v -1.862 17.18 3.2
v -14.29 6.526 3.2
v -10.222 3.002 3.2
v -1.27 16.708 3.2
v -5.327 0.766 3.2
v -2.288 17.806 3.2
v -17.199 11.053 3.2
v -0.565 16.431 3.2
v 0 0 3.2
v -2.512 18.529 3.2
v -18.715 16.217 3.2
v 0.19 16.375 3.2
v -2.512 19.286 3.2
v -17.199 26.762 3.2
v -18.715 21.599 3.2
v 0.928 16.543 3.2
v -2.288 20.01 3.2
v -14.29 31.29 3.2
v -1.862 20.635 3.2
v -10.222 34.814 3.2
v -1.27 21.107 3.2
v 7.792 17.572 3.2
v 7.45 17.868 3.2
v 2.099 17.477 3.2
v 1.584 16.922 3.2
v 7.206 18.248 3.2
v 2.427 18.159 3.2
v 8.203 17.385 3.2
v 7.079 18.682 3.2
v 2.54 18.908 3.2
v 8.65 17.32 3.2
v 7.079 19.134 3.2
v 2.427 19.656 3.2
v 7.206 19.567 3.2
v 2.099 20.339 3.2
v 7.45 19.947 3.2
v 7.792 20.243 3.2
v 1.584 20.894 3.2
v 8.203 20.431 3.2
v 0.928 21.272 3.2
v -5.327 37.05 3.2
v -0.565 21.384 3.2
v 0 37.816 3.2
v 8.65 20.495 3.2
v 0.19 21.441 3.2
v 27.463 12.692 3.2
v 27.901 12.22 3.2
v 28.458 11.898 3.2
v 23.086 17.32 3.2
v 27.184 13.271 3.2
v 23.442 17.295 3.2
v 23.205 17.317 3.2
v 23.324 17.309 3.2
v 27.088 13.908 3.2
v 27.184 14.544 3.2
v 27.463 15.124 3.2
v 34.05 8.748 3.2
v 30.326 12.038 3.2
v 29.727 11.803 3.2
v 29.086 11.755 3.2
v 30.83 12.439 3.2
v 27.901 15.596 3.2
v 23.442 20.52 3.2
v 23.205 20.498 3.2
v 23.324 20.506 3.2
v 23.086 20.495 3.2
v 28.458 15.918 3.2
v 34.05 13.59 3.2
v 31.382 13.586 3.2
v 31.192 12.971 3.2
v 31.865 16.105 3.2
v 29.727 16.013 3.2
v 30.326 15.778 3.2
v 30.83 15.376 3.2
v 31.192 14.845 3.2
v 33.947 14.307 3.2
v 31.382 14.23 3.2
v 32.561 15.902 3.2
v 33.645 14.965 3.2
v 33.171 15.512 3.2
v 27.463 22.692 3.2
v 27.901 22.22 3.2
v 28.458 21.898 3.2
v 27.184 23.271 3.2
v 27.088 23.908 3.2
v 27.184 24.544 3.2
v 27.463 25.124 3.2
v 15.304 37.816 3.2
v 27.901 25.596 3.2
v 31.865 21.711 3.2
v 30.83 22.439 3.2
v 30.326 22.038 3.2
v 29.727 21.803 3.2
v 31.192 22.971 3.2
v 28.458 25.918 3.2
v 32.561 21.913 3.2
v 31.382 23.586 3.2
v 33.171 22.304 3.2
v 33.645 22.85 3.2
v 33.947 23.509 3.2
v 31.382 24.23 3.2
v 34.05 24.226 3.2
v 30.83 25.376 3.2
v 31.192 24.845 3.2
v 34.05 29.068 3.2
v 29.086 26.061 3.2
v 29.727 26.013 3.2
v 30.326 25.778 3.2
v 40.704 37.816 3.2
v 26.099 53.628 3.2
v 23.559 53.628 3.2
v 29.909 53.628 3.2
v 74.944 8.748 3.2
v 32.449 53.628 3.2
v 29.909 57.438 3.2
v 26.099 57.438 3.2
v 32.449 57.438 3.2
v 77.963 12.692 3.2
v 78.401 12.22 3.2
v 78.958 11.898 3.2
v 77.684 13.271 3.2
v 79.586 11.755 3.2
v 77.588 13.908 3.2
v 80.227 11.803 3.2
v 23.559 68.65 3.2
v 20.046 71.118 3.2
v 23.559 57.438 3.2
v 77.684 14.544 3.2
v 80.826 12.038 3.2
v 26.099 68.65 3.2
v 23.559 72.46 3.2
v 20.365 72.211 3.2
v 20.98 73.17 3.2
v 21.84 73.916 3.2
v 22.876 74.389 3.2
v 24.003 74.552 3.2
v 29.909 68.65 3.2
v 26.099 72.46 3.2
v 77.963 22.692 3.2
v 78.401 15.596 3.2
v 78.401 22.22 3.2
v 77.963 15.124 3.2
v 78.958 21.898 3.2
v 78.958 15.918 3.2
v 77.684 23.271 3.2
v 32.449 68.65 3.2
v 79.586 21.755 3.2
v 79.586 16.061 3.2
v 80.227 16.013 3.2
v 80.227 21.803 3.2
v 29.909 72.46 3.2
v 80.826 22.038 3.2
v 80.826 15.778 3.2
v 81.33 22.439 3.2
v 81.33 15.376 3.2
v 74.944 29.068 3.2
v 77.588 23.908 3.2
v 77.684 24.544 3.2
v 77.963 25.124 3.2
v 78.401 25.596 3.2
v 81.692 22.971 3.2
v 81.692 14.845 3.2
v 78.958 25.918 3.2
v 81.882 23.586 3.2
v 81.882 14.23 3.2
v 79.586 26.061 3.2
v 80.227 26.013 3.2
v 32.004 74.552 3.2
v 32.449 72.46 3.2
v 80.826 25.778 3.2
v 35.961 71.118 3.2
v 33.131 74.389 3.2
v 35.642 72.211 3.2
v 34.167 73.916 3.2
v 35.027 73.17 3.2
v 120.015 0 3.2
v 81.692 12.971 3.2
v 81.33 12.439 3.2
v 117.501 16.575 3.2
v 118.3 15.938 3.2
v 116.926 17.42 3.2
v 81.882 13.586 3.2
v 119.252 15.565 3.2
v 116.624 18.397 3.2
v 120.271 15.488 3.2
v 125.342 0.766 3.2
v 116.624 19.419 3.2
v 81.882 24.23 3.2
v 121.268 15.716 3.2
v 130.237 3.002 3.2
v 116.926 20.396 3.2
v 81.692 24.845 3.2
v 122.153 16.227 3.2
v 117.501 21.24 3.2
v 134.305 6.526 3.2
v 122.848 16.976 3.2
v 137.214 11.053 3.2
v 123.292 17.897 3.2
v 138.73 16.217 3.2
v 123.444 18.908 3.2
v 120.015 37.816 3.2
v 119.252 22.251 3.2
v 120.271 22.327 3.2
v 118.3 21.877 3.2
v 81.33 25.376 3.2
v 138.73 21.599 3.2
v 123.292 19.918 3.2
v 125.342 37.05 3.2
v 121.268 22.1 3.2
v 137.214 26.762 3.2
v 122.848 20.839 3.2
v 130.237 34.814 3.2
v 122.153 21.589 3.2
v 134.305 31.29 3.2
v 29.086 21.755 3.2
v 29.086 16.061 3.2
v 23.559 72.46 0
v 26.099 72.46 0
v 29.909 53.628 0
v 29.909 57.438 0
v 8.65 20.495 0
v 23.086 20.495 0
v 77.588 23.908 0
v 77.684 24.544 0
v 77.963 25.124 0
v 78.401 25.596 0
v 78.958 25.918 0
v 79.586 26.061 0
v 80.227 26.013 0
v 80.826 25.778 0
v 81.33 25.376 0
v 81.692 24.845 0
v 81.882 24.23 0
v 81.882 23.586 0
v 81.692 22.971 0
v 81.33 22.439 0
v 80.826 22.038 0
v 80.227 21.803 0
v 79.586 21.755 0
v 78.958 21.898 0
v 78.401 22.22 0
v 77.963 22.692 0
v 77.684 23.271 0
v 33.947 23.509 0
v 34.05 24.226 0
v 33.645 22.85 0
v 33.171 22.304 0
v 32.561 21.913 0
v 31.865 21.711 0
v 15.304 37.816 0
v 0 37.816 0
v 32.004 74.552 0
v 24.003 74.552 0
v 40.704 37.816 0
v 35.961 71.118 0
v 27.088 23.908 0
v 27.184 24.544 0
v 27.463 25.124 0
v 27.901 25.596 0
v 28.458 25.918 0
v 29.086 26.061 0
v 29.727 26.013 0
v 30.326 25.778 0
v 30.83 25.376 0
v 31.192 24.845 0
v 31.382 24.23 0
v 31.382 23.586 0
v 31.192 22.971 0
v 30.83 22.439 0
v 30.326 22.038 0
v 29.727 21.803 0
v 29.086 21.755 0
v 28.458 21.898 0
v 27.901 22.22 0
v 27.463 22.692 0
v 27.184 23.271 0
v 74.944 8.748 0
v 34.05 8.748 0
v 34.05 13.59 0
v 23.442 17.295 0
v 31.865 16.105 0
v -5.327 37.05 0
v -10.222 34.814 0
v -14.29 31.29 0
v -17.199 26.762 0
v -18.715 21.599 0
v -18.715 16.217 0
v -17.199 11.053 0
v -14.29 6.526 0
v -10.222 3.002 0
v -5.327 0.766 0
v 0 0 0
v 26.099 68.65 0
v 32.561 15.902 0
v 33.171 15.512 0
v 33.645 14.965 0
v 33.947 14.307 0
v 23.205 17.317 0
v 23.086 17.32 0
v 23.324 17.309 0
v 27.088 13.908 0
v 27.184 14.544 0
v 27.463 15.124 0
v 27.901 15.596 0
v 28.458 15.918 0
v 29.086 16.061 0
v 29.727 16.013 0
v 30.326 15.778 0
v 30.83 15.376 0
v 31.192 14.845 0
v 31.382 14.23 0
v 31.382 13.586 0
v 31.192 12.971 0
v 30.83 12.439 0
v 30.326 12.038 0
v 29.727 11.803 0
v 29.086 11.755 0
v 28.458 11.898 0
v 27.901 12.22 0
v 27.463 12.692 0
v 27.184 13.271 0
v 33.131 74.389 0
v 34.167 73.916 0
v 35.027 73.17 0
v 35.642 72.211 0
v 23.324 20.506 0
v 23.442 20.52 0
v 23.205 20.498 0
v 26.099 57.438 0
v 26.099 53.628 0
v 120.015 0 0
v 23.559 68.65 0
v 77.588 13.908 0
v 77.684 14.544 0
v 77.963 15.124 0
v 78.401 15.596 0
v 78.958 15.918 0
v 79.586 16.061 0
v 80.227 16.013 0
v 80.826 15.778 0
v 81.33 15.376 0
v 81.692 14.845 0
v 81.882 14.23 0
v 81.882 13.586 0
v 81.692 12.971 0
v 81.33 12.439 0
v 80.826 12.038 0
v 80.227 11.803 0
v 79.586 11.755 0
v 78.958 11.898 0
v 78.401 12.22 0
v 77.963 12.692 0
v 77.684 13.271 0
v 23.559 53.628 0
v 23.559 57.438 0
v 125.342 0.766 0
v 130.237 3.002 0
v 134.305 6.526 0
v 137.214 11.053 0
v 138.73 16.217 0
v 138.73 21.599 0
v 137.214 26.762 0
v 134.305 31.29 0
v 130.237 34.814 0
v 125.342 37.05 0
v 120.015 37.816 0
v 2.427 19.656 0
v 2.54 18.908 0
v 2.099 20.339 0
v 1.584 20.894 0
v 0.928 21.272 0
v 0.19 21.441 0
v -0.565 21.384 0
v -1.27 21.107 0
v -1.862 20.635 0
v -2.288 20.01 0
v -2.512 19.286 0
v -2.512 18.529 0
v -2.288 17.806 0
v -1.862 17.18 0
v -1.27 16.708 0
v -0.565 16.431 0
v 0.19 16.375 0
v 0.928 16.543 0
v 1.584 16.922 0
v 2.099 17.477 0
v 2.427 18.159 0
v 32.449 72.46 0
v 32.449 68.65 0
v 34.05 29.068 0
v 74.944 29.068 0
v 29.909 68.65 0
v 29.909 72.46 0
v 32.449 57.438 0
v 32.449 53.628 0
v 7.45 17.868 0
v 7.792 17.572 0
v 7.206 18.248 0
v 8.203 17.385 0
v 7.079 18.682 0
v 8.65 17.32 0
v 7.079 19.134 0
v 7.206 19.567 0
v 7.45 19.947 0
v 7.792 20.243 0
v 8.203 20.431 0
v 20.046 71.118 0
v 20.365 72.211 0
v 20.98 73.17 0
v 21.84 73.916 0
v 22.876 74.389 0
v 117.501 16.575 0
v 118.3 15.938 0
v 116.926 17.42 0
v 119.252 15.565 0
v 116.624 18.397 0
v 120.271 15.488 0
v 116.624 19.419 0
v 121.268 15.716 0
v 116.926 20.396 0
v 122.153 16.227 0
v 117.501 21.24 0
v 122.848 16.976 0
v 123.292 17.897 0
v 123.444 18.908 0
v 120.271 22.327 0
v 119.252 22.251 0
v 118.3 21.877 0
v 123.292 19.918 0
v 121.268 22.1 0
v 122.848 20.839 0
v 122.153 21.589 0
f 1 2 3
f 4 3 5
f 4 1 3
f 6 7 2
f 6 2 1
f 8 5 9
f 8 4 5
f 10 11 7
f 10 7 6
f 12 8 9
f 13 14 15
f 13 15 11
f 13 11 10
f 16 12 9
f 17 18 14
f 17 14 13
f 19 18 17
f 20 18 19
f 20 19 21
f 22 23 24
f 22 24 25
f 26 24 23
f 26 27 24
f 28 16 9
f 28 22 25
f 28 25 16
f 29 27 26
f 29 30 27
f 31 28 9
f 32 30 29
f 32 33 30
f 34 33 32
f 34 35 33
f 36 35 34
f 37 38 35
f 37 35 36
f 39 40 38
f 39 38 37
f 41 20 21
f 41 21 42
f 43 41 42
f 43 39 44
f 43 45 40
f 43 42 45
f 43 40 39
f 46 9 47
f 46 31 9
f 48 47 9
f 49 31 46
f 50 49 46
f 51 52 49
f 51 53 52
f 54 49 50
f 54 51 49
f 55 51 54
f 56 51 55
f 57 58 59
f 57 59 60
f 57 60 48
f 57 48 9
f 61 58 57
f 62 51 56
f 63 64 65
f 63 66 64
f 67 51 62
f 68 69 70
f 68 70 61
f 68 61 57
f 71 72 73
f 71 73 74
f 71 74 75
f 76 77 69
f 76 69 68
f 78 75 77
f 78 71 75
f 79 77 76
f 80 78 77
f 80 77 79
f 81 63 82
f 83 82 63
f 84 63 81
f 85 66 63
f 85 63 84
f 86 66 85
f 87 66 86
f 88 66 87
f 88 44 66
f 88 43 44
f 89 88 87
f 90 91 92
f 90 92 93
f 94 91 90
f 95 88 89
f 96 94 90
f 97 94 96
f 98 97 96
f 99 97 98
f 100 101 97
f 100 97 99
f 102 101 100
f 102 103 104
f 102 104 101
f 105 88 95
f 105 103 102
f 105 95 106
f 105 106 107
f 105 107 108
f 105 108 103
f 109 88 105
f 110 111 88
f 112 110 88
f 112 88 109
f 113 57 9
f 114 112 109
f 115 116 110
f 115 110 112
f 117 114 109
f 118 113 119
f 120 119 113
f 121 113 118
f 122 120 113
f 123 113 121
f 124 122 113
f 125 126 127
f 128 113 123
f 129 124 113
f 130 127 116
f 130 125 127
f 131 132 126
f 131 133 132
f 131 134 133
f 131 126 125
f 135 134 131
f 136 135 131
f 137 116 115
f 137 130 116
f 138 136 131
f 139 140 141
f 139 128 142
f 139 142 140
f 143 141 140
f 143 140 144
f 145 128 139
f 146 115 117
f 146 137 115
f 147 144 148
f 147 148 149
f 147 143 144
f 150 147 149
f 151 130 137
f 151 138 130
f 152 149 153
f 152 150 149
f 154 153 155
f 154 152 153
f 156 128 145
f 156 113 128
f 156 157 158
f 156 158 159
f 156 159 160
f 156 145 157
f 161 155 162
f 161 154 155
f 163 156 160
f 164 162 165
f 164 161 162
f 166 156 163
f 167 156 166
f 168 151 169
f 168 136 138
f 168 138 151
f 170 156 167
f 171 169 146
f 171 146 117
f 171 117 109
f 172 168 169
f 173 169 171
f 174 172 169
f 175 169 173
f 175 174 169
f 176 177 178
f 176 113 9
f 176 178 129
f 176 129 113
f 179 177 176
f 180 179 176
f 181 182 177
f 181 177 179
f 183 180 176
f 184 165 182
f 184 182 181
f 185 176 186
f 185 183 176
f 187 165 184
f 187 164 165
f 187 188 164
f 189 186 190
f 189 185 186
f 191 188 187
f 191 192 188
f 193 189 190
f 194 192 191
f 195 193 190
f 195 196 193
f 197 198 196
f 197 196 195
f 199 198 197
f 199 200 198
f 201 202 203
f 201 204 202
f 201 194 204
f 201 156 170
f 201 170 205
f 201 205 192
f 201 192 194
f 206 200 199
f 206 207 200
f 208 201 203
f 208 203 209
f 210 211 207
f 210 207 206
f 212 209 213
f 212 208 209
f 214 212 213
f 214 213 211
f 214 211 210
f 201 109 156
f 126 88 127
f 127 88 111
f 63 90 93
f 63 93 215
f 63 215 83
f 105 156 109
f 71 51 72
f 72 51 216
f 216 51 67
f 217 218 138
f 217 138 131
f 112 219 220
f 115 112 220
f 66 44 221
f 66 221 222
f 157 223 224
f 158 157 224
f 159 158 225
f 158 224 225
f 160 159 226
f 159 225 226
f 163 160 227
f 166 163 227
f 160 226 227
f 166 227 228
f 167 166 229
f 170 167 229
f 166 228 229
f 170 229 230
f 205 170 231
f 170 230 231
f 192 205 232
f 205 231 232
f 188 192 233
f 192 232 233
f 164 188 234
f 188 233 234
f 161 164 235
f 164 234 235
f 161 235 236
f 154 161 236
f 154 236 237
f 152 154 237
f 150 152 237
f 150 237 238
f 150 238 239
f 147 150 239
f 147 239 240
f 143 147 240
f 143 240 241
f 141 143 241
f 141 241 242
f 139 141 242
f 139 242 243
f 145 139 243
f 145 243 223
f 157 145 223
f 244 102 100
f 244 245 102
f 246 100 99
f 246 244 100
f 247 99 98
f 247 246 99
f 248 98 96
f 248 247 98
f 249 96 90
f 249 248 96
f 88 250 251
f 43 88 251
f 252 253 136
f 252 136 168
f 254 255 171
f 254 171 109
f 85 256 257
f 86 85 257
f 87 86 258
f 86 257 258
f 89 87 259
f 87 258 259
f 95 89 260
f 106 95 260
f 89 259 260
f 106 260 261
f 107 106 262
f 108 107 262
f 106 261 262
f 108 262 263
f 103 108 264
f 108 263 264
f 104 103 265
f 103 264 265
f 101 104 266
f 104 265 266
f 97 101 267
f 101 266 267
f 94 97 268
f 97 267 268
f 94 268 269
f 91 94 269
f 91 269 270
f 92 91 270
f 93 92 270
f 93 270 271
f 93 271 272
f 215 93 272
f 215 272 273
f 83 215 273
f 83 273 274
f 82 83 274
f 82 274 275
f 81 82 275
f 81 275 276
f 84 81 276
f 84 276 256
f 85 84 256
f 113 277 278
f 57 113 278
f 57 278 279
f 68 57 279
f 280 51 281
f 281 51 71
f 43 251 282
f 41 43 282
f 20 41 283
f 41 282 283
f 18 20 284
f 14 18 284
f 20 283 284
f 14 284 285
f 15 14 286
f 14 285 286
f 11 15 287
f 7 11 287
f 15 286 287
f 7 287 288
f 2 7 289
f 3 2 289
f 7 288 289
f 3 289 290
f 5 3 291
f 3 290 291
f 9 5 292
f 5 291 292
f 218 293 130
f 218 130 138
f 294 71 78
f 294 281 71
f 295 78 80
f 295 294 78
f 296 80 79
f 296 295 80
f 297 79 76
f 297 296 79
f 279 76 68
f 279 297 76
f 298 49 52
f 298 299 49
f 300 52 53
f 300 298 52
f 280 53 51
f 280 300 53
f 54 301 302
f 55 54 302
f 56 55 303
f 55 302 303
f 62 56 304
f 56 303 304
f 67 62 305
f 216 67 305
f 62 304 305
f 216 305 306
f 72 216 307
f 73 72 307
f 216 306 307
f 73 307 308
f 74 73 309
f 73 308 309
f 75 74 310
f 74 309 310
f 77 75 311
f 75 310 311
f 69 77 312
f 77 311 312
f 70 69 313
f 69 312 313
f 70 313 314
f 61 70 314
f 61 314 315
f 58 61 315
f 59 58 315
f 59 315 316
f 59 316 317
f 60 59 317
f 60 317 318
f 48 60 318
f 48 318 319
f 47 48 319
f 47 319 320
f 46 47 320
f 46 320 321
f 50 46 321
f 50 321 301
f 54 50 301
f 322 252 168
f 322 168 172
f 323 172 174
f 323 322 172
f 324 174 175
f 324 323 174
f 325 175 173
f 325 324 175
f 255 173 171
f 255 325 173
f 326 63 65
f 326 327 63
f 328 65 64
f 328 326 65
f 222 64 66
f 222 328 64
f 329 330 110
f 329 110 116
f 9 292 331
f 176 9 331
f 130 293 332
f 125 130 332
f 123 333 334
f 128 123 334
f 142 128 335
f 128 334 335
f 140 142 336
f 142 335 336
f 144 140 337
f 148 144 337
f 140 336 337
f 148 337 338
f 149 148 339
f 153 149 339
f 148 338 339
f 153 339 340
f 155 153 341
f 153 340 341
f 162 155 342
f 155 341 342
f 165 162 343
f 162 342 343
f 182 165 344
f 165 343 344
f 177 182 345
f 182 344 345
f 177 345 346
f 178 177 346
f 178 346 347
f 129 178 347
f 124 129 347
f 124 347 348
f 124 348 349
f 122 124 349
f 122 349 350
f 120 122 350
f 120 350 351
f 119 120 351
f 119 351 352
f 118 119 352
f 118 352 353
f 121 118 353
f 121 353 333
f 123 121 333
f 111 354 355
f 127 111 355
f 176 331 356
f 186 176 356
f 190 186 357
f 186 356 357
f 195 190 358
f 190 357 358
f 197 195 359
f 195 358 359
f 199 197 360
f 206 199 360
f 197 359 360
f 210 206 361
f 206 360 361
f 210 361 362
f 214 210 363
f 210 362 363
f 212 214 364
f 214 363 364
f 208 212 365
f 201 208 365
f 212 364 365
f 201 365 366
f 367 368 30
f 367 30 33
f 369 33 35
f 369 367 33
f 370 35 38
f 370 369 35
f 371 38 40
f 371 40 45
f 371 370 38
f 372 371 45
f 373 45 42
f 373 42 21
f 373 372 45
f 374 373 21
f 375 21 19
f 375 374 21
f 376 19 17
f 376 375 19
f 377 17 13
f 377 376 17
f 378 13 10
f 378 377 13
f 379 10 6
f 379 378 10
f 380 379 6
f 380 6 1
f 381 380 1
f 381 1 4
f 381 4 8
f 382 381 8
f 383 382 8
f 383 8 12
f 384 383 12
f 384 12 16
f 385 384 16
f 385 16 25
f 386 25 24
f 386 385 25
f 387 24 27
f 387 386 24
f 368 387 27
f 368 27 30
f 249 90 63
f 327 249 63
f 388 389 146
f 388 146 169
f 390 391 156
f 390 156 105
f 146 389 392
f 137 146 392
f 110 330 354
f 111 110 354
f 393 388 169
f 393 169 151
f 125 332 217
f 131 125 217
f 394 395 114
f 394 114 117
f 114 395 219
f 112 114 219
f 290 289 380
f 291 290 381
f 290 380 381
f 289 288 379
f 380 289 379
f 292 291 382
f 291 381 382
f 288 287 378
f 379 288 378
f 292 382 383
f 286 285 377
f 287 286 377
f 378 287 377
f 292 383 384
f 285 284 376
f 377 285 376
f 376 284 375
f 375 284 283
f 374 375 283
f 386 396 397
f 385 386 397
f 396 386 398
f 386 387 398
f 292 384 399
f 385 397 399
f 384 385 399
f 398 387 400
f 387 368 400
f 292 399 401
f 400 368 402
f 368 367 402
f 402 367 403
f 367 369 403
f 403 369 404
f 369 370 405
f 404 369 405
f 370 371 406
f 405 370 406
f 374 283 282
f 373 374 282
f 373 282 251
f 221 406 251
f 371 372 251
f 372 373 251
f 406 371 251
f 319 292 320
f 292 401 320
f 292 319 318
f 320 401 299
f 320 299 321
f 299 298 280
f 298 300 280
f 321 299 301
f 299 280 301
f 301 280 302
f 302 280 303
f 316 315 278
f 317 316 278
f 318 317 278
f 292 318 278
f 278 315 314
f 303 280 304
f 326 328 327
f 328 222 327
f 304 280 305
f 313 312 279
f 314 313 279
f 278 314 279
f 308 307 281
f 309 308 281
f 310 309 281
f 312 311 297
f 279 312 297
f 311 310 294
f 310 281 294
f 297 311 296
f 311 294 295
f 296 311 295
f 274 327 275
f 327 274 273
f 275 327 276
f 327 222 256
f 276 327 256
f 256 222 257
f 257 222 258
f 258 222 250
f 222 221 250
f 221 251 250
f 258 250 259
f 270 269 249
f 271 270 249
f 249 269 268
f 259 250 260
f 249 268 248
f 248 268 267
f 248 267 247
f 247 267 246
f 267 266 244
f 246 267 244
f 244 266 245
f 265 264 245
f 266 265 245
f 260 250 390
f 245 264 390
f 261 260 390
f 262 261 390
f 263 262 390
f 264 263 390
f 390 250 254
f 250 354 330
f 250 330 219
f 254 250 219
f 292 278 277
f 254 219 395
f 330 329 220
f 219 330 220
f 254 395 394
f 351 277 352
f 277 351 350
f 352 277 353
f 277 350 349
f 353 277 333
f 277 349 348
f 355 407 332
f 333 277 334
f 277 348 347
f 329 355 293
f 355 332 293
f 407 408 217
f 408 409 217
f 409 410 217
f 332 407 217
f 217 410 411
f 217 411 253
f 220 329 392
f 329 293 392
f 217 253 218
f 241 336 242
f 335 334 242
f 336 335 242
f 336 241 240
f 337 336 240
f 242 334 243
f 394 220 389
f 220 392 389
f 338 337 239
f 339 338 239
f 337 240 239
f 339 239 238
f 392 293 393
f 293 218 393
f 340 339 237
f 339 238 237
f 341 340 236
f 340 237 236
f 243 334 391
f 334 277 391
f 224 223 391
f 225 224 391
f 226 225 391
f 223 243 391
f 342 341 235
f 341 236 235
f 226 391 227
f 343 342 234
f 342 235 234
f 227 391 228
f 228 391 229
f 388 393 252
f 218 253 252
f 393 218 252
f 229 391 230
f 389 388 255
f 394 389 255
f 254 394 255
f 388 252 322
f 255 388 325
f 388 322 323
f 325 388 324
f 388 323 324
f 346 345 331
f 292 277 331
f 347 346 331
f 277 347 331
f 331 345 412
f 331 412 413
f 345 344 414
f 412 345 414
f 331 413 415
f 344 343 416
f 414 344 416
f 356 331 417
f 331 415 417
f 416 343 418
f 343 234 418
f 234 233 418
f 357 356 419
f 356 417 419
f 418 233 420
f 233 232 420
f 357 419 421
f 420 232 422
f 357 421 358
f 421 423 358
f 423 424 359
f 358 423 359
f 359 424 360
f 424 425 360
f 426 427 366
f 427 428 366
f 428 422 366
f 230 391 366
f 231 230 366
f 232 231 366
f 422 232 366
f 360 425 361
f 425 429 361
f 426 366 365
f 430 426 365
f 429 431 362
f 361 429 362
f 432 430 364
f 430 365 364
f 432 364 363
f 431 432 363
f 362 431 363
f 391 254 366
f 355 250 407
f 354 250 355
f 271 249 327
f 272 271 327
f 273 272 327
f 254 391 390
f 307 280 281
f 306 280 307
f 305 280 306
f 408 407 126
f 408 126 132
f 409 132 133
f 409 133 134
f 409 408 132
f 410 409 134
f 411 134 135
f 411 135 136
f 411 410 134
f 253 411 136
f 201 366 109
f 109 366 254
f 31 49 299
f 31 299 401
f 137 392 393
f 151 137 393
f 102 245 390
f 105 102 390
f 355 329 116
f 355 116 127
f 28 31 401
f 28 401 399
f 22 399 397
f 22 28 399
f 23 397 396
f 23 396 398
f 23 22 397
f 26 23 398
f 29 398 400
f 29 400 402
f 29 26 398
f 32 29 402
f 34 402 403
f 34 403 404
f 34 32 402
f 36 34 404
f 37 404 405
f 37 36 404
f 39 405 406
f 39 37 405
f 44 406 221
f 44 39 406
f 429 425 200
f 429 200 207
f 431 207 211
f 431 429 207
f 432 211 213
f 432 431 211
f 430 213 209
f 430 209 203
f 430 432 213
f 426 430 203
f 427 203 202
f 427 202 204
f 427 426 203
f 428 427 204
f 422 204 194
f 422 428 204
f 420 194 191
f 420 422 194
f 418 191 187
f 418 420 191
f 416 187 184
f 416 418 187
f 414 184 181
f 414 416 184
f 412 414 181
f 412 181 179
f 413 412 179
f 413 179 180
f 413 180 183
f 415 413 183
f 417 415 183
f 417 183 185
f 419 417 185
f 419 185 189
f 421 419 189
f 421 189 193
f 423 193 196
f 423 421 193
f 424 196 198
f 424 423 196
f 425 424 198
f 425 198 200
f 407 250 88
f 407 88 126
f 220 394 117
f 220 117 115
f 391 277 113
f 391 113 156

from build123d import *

# Parameters (mm, degrees)
SKETCH1_R           = 3.429
SKETCH1_R_2         = 2.54
BOSS_EXTRUDE1_DEPTH = 3.2004
SKETCH5_R           = 2.159
SKETCH5_W           = 40.894
SKETCH5_H           = 20.32
CUT_EXTRUDE3_DEPTH  = 4.2004
CUT_EXTRUDE4_DEPTH  = 3.2004
CUT_EXTRUDE5_DEPTH  = 3.2004
SKETCH9_W           = 2.54
SKETCH9_H           = 3.81
BOSS_EXTRUDE2_DEPTH = 3.2004
FILLET1_R           = 2.54


with BuildPart() as part:
    # Sketch1 → Boss-Extrude1 (new body)
    with BuildSketch(Plane.XY):
        with BuildLine():
            Line((120.015, 37.81552), (0, 37.81552))
            ThreePointArc((0, 37.81552), (-18.90776, 18.90776), (0, 0))
            Line((0, 0), (120.015, 0))
            ThreePointArc((120.015, 0), (138.92276, 18.90776), (120.015, 37.81552))
        make_face()
        with Locations((120.015, 18.90776)):
            Circle(SKETCH1_R, mode=Mode.SUBTRACT)
        with Locations((0, 18.90776)):
            Circle(SKETCH1_R_2, mode=Mode.SUBTRACT)
    extrude(amount=BOSS_EXTRUDE1_DEPTH)

    # Sketch5 → Cut-Extrude3 (cut, through all)
    with BuildSketch(Plane(origin=(0, 0, 0), x_dir=(-1, 0, 0), z_dir=(0, 0, -1))):
        with Locations((-79.746999972, 23.90776)):
            Circle(SKETCH5_R)
        with Locations((-29.246999972, 13.90776)):
            Circle(SKETCH5_R)
        with Locations((-29.246999972, 23.90776)):
            Circle(SKETCH5_R)
        with Locations((-79.746999972, 13.90776)):
            Circle(SKETCH5_R)
        with Locations((-54.496999972, 18.90776)):
            Rectangle(SKETCH5_W, SKETCH5_H)
    extrude(amount=-CUT_EXTRUDE3_DEPTH, mode=Mode.SUBTRACT)

    # Sketch6 → Cut-Extrude4 (cut)
    with BuildSketch(Plane.XY.offset(3.2004)):
        with BuildLine():
            Line((8.649999972, 20.49526), (25.159999972, 20.49526))
            ThreePointArc((25.159999972, 20.49526), (26.747499972, 18.90776), (25.159999972, 17.32026))
            Line((25.159999972, 17.32026), (8.649999972, 17.32026))
            ThreePointArc((8.649999972, 17.32026), (7.062499972, 18.90776), (8.649999972, 20.49526))
        make_face()
    extrude(amount=-CUT_EXTRUDE4_DEPTH, mode=Mode.SUBTRACT)

    # Sketch8 → Cut-Extrude5 (cut)
    with BuildSketch(Plane.XY.offset(3.2004)):
        Polygon((34.049999972, 15.79626), (34.049999972, 22.01926), (23.264769203, 20.49526), (23.264769203, 17.32026), align=None)
    extrude(amount=-CUT_EXTRUDE5_DEPTH, mode=Mode.SUBTRACT)

    # Sketch9 → Boss-Extrude2 (add)
    with BuildSketch(Plane(origin=(0, 0, 0), x_dir=(-1, 0, 0), z_dir=(0, 0, -1))):
        with BuildLine():
            Line((-40.703500071, 37.81552), (-15.303500071, 37.81552))
            Line((-15.303500071, 37.81552), (-20.045783141, 71.118080223))
            ThreePointArc((-20.045783141, 71.118080223), (-21.383392309, 73.573639076), (-24.003000071, 74.551710005))
            Line((-24.003000071, 74.551710005), (-32.004000071, 74.551710005))
            ThreePointArc((-32.004000071, 74.551710005), (-34.623607833, 73.573639076), (-35.961217, 71.118080223))
            Line((-35.961217, 71.118080223), (-40.703500071, 37.81552))
        make_face()
        with Locations((-31.178500071, 55.533488225)):
            Rectangle(SKETCH9_W, SKETCH9_H, mode=Mode.SUBTRACT)
        with Locations((-24.828500071, 55.533488225)):
            Rectangle(SKETCH9_W, SKETCH9_H, mode=Mode.SUBTRACT)
        with Locations((-31.178500071, 70.554572711)):
            Rectangle(SKETCH9_W, SKETCH9_H, mode=Mode.SUBTRACT)
        with Locations((-24.828500071, 70.554572711)):
            Rectangle(SKETCH9_W, SKETCH9_H, mode=Mode.SUBTRACT)
    extrude(amount=-BOSS_EXTRUDE2_DEPTH)

    # Fillet1
    fillet1_edges = [part.edges().sort_by_distance(p)[0] for p in [
        (34.049999972, 22.01926, 1.6002),
        (23.264769203, 20.49526, 1.6002),
        (23.264769203, 17.32026, 1.6002),
        (34.049999972, 15.79626, 1.6002),
    ]]
    fillet(fillet1_edges, radius=FILLET1_R)


solid = part.part
